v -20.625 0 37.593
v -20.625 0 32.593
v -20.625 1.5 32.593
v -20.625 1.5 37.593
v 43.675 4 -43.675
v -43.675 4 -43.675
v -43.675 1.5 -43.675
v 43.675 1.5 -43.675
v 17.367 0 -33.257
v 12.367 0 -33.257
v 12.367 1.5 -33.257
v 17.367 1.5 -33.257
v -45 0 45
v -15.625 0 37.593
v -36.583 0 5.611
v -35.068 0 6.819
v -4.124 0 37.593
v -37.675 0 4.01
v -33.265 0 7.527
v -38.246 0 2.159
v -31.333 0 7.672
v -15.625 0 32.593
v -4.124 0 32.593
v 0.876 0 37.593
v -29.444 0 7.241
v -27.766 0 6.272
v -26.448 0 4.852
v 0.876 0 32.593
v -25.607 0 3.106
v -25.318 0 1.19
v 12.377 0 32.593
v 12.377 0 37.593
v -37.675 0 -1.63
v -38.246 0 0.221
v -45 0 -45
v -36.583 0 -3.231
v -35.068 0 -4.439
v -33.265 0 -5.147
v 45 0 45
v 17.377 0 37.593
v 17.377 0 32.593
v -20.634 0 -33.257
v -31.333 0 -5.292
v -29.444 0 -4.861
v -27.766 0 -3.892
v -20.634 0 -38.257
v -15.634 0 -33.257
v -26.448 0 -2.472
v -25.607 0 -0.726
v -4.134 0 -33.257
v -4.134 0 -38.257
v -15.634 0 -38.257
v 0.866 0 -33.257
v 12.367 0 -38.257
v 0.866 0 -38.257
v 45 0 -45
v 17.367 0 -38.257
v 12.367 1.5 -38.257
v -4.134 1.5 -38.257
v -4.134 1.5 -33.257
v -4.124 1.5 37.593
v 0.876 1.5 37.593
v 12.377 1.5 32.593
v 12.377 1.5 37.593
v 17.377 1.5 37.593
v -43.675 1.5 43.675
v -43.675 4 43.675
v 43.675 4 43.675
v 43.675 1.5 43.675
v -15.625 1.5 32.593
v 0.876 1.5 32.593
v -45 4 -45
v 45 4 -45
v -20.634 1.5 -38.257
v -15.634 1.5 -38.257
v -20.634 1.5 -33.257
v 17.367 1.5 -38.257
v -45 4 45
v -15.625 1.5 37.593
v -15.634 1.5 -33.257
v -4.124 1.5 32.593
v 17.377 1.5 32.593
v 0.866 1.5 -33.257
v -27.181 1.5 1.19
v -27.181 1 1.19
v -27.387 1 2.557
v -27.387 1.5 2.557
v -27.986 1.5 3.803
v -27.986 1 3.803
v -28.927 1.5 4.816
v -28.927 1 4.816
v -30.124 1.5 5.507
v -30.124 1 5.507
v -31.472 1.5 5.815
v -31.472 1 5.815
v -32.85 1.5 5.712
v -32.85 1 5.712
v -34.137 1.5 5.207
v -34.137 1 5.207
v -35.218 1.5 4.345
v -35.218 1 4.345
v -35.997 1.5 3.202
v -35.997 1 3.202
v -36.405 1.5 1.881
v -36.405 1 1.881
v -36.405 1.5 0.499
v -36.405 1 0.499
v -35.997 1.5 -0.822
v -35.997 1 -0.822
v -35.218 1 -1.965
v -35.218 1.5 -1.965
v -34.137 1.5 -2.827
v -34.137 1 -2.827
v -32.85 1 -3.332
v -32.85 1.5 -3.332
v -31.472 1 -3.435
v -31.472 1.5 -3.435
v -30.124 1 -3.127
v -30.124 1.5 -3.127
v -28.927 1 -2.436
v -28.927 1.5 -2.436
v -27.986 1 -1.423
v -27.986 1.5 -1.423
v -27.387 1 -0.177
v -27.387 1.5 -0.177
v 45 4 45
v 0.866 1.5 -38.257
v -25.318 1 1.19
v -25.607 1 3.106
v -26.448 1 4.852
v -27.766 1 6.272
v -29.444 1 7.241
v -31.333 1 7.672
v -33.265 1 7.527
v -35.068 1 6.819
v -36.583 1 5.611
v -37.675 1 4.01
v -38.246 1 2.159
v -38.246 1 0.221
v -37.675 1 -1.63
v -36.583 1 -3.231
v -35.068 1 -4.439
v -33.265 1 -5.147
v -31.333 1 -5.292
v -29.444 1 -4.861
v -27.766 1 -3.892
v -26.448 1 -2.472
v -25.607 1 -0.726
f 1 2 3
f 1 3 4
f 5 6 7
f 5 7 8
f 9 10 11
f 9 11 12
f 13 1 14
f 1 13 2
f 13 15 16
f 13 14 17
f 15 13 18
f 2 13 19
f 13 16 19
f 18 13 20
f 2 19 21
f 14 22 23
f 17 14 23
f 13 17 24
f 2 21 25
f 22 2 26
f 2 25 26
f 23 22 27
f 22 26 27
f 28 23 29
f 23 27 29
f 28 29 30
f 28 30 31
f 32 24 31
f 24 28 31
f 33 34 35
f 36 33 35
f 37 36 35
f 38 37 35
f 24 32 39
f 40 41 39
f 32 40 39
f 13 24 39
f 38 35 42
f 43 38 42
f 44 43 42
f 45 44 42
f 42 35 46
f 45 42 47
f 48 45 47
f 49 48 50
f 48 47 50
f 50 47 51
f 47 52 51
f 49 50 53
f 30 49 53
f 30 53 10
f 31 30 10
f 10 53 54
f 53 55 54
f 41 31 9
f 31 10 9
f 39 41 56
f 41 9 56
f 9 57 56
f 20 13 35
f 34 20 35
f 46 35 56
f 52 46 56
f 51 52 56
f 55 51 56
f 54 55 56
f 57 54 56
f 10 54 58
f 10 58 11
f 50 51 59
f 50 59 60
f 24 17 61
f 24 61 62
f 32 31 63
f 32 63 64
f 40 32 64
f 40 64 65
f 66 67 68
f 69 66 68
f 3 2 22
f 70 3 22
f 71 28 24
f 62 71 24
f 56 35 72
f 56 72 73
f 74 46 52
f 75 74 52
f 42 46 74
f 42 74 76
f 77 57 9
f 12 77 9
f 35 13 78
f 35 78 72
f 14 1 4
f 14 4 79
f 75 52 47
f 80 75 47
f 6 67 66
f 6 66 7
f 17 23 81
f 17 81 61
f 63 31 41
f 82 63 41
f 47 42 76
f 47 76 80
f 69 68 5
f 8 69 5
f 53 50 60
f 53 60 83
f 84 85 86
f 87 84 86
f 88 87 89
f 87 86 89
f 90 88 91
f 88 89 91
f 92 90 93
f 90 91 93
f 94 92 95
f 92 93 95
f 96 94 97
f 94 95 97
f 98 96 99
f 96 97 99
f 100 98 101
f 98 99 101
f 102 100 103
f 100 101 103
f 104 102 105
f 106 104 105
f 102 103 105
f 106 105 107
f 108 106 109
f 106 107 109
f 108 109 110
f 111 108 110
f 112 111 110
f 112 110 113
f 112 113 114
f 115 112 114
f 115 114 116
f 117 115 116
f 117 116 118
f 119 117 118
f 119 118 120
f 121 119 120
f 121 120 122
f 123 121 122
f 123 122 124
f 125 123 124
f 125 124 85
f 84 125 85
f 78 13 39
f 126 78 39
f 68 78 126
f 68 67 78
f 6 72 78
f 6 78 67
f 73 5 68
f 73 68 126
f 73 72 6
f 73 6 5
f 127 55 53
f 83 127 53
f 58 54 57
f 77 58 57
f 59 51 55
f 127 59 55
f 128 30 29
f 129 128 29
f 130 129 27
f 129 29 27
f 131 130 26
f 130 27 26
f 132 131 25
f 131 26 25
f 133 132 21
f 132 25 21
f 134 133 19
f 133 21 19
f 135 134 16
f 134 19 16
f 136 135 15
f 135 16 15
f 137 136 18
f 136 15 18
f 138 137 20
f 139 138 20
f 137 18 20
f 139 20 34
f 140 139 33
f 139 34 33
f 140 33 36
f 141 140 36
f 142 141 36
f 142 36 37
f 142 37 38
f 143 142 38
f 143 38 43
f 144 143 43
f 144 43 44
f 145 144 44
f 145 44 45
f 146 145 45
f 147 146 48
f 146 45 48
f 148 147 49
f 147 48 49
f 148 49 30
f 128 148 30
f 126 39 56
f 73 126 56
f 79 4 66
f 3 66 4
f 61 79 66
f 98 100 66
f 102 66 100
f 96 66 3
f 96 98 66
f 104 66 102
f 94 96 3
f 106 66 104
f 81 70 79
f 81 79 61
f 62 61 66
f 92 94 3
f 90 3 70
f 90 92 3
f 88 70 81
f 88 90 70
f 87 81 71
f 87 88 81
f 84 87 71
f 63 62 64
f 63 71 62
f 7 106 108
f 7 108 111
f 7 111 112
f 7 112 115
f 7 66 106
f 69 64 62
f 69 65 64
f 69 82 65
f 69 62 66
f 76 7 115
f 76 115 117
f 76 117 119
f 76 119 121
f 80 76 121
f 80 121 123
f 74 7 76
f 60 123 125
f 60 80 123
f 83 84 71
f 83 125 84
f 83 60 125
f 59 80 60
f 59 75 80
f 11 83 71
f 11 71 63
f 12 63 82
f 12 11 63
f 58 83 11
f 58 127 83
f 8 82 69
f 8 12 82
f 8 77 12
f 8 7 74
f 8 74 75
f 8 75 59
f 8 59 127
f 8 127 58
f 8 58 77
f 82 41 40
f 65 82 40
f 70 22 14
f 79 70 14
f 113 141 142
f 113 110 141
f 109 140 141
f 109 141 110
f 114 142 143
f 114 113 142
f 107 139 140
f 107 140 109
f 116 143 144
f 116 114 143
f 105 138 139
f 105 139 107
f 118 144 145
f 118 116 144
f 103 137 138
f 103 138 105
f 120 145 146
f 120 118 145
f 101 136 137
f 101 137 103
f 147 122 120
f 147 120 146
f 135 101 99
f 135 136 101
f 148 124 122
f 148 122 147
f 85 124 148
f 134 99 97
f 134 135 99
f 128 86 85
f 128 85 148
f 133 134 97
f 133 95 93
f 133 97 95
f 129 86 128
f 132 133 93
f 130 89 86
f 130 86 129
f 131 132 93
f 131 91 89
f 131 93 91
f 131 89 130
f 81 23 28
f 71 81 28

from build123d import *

# Parameters (mm, degrees)
SKETCH1_W           = 90
SKETCH1_H           = 90
BOSS_EXTRUDE1_DEPTH = 4
SKETCH2_W           = 87.35
SKETCH2_H           = 87.35
CUT_EXTRUDE2_DEPTH  = 2.5
SKETCH6_W           = 5
SKETCH6_H           = 5
CUT_EXTRUDE5_DEPTH  = 3
SKETCH7_R           = 6.5
CUT_EXTRUDE6_DEPTH  = 1
SKETCH8_R           = 4.637905468
CUT_EXTRUDE7_DEPTH  = 2.7


with BuildPart() as part:
    # Sketch1 → Boss-Extrude1 (new body)
    with BuildSketch(Plane(origin=(0, 0, 0), x_dir=(1, 0, 0), z_dir=(0, 1, 0))):
        Rectangle(SKETCH1_W, SKETCH1_H)
    extrude(amount=BOSS_EXTRUDE1_DEPTH)

    # Sketch2 → Cut-Extrude2 (cut)
    with BuildSketch(Plane(origin=(0, 4, 0), x_dir=(1, 0, 0), z_dir=(0, 1, 0))):
        Rectangle(SKETCH2_W, SKETCH2_H)
    extrude(amount=-CUT_EXTRUDE2_DEPTH, mode=Mode.SUBTRACT)

    # Sketch6 → Cut-Extrude5 (cut)
    with BuildSketch(Plane.XZ):
        with Locations((14.866822719, -35.757474477)):
            Rectangle(SKETCH6_W, SKETCH6_H)
        with Locations((-1.633815548, -35.757474477)):
            Rectangle(SKETCH6_W, SKETCH6_H)
        with Locations((-18.134453815, -35.757474477)):
            Rectangle(SKETCH6_W, SKETCH6_H)
        with Locations((14.87666148, 35.092600442)):
            Rectangle(SKETCH6_W, SKETCH6_H)
        with Locations((-1.623976787, 35.092600442)):
            Rectangle(SKETCH6_W, SKETCH6_H)
        with Locations((-18.124615054, 35.092600442)):
            Rectangle(SKETCH6_W, SKETCH6_H)
    extrude(amount=-CUT_EXTRUDE5_DEPTH, mode=Mode.SUBTRACT)

    # Sketch7 → Cut-Extrude6 (cut)
    with BuildSketch(Plane.XZ):
        with Locations((-31.818415868, 1.190037438)):
            Circle(SKETCH7_R)
    extrude(amount=-CUT_EXTRUDE6_DEPTH, mode=Mode.SUBTRACT)

    # Sketch8 → Cut-Extrude7 (cut)
    with BuildSketch(Plane.XZ.offset(-1)):
        with Locations((-31.818415868, 1.190037438)):
            Circle(SKETCH8_R)
    extrude(amount=-CUT_EXTRUDE7_DEPTH, mode=Mode.SUBTRACT)


solid = part.part
